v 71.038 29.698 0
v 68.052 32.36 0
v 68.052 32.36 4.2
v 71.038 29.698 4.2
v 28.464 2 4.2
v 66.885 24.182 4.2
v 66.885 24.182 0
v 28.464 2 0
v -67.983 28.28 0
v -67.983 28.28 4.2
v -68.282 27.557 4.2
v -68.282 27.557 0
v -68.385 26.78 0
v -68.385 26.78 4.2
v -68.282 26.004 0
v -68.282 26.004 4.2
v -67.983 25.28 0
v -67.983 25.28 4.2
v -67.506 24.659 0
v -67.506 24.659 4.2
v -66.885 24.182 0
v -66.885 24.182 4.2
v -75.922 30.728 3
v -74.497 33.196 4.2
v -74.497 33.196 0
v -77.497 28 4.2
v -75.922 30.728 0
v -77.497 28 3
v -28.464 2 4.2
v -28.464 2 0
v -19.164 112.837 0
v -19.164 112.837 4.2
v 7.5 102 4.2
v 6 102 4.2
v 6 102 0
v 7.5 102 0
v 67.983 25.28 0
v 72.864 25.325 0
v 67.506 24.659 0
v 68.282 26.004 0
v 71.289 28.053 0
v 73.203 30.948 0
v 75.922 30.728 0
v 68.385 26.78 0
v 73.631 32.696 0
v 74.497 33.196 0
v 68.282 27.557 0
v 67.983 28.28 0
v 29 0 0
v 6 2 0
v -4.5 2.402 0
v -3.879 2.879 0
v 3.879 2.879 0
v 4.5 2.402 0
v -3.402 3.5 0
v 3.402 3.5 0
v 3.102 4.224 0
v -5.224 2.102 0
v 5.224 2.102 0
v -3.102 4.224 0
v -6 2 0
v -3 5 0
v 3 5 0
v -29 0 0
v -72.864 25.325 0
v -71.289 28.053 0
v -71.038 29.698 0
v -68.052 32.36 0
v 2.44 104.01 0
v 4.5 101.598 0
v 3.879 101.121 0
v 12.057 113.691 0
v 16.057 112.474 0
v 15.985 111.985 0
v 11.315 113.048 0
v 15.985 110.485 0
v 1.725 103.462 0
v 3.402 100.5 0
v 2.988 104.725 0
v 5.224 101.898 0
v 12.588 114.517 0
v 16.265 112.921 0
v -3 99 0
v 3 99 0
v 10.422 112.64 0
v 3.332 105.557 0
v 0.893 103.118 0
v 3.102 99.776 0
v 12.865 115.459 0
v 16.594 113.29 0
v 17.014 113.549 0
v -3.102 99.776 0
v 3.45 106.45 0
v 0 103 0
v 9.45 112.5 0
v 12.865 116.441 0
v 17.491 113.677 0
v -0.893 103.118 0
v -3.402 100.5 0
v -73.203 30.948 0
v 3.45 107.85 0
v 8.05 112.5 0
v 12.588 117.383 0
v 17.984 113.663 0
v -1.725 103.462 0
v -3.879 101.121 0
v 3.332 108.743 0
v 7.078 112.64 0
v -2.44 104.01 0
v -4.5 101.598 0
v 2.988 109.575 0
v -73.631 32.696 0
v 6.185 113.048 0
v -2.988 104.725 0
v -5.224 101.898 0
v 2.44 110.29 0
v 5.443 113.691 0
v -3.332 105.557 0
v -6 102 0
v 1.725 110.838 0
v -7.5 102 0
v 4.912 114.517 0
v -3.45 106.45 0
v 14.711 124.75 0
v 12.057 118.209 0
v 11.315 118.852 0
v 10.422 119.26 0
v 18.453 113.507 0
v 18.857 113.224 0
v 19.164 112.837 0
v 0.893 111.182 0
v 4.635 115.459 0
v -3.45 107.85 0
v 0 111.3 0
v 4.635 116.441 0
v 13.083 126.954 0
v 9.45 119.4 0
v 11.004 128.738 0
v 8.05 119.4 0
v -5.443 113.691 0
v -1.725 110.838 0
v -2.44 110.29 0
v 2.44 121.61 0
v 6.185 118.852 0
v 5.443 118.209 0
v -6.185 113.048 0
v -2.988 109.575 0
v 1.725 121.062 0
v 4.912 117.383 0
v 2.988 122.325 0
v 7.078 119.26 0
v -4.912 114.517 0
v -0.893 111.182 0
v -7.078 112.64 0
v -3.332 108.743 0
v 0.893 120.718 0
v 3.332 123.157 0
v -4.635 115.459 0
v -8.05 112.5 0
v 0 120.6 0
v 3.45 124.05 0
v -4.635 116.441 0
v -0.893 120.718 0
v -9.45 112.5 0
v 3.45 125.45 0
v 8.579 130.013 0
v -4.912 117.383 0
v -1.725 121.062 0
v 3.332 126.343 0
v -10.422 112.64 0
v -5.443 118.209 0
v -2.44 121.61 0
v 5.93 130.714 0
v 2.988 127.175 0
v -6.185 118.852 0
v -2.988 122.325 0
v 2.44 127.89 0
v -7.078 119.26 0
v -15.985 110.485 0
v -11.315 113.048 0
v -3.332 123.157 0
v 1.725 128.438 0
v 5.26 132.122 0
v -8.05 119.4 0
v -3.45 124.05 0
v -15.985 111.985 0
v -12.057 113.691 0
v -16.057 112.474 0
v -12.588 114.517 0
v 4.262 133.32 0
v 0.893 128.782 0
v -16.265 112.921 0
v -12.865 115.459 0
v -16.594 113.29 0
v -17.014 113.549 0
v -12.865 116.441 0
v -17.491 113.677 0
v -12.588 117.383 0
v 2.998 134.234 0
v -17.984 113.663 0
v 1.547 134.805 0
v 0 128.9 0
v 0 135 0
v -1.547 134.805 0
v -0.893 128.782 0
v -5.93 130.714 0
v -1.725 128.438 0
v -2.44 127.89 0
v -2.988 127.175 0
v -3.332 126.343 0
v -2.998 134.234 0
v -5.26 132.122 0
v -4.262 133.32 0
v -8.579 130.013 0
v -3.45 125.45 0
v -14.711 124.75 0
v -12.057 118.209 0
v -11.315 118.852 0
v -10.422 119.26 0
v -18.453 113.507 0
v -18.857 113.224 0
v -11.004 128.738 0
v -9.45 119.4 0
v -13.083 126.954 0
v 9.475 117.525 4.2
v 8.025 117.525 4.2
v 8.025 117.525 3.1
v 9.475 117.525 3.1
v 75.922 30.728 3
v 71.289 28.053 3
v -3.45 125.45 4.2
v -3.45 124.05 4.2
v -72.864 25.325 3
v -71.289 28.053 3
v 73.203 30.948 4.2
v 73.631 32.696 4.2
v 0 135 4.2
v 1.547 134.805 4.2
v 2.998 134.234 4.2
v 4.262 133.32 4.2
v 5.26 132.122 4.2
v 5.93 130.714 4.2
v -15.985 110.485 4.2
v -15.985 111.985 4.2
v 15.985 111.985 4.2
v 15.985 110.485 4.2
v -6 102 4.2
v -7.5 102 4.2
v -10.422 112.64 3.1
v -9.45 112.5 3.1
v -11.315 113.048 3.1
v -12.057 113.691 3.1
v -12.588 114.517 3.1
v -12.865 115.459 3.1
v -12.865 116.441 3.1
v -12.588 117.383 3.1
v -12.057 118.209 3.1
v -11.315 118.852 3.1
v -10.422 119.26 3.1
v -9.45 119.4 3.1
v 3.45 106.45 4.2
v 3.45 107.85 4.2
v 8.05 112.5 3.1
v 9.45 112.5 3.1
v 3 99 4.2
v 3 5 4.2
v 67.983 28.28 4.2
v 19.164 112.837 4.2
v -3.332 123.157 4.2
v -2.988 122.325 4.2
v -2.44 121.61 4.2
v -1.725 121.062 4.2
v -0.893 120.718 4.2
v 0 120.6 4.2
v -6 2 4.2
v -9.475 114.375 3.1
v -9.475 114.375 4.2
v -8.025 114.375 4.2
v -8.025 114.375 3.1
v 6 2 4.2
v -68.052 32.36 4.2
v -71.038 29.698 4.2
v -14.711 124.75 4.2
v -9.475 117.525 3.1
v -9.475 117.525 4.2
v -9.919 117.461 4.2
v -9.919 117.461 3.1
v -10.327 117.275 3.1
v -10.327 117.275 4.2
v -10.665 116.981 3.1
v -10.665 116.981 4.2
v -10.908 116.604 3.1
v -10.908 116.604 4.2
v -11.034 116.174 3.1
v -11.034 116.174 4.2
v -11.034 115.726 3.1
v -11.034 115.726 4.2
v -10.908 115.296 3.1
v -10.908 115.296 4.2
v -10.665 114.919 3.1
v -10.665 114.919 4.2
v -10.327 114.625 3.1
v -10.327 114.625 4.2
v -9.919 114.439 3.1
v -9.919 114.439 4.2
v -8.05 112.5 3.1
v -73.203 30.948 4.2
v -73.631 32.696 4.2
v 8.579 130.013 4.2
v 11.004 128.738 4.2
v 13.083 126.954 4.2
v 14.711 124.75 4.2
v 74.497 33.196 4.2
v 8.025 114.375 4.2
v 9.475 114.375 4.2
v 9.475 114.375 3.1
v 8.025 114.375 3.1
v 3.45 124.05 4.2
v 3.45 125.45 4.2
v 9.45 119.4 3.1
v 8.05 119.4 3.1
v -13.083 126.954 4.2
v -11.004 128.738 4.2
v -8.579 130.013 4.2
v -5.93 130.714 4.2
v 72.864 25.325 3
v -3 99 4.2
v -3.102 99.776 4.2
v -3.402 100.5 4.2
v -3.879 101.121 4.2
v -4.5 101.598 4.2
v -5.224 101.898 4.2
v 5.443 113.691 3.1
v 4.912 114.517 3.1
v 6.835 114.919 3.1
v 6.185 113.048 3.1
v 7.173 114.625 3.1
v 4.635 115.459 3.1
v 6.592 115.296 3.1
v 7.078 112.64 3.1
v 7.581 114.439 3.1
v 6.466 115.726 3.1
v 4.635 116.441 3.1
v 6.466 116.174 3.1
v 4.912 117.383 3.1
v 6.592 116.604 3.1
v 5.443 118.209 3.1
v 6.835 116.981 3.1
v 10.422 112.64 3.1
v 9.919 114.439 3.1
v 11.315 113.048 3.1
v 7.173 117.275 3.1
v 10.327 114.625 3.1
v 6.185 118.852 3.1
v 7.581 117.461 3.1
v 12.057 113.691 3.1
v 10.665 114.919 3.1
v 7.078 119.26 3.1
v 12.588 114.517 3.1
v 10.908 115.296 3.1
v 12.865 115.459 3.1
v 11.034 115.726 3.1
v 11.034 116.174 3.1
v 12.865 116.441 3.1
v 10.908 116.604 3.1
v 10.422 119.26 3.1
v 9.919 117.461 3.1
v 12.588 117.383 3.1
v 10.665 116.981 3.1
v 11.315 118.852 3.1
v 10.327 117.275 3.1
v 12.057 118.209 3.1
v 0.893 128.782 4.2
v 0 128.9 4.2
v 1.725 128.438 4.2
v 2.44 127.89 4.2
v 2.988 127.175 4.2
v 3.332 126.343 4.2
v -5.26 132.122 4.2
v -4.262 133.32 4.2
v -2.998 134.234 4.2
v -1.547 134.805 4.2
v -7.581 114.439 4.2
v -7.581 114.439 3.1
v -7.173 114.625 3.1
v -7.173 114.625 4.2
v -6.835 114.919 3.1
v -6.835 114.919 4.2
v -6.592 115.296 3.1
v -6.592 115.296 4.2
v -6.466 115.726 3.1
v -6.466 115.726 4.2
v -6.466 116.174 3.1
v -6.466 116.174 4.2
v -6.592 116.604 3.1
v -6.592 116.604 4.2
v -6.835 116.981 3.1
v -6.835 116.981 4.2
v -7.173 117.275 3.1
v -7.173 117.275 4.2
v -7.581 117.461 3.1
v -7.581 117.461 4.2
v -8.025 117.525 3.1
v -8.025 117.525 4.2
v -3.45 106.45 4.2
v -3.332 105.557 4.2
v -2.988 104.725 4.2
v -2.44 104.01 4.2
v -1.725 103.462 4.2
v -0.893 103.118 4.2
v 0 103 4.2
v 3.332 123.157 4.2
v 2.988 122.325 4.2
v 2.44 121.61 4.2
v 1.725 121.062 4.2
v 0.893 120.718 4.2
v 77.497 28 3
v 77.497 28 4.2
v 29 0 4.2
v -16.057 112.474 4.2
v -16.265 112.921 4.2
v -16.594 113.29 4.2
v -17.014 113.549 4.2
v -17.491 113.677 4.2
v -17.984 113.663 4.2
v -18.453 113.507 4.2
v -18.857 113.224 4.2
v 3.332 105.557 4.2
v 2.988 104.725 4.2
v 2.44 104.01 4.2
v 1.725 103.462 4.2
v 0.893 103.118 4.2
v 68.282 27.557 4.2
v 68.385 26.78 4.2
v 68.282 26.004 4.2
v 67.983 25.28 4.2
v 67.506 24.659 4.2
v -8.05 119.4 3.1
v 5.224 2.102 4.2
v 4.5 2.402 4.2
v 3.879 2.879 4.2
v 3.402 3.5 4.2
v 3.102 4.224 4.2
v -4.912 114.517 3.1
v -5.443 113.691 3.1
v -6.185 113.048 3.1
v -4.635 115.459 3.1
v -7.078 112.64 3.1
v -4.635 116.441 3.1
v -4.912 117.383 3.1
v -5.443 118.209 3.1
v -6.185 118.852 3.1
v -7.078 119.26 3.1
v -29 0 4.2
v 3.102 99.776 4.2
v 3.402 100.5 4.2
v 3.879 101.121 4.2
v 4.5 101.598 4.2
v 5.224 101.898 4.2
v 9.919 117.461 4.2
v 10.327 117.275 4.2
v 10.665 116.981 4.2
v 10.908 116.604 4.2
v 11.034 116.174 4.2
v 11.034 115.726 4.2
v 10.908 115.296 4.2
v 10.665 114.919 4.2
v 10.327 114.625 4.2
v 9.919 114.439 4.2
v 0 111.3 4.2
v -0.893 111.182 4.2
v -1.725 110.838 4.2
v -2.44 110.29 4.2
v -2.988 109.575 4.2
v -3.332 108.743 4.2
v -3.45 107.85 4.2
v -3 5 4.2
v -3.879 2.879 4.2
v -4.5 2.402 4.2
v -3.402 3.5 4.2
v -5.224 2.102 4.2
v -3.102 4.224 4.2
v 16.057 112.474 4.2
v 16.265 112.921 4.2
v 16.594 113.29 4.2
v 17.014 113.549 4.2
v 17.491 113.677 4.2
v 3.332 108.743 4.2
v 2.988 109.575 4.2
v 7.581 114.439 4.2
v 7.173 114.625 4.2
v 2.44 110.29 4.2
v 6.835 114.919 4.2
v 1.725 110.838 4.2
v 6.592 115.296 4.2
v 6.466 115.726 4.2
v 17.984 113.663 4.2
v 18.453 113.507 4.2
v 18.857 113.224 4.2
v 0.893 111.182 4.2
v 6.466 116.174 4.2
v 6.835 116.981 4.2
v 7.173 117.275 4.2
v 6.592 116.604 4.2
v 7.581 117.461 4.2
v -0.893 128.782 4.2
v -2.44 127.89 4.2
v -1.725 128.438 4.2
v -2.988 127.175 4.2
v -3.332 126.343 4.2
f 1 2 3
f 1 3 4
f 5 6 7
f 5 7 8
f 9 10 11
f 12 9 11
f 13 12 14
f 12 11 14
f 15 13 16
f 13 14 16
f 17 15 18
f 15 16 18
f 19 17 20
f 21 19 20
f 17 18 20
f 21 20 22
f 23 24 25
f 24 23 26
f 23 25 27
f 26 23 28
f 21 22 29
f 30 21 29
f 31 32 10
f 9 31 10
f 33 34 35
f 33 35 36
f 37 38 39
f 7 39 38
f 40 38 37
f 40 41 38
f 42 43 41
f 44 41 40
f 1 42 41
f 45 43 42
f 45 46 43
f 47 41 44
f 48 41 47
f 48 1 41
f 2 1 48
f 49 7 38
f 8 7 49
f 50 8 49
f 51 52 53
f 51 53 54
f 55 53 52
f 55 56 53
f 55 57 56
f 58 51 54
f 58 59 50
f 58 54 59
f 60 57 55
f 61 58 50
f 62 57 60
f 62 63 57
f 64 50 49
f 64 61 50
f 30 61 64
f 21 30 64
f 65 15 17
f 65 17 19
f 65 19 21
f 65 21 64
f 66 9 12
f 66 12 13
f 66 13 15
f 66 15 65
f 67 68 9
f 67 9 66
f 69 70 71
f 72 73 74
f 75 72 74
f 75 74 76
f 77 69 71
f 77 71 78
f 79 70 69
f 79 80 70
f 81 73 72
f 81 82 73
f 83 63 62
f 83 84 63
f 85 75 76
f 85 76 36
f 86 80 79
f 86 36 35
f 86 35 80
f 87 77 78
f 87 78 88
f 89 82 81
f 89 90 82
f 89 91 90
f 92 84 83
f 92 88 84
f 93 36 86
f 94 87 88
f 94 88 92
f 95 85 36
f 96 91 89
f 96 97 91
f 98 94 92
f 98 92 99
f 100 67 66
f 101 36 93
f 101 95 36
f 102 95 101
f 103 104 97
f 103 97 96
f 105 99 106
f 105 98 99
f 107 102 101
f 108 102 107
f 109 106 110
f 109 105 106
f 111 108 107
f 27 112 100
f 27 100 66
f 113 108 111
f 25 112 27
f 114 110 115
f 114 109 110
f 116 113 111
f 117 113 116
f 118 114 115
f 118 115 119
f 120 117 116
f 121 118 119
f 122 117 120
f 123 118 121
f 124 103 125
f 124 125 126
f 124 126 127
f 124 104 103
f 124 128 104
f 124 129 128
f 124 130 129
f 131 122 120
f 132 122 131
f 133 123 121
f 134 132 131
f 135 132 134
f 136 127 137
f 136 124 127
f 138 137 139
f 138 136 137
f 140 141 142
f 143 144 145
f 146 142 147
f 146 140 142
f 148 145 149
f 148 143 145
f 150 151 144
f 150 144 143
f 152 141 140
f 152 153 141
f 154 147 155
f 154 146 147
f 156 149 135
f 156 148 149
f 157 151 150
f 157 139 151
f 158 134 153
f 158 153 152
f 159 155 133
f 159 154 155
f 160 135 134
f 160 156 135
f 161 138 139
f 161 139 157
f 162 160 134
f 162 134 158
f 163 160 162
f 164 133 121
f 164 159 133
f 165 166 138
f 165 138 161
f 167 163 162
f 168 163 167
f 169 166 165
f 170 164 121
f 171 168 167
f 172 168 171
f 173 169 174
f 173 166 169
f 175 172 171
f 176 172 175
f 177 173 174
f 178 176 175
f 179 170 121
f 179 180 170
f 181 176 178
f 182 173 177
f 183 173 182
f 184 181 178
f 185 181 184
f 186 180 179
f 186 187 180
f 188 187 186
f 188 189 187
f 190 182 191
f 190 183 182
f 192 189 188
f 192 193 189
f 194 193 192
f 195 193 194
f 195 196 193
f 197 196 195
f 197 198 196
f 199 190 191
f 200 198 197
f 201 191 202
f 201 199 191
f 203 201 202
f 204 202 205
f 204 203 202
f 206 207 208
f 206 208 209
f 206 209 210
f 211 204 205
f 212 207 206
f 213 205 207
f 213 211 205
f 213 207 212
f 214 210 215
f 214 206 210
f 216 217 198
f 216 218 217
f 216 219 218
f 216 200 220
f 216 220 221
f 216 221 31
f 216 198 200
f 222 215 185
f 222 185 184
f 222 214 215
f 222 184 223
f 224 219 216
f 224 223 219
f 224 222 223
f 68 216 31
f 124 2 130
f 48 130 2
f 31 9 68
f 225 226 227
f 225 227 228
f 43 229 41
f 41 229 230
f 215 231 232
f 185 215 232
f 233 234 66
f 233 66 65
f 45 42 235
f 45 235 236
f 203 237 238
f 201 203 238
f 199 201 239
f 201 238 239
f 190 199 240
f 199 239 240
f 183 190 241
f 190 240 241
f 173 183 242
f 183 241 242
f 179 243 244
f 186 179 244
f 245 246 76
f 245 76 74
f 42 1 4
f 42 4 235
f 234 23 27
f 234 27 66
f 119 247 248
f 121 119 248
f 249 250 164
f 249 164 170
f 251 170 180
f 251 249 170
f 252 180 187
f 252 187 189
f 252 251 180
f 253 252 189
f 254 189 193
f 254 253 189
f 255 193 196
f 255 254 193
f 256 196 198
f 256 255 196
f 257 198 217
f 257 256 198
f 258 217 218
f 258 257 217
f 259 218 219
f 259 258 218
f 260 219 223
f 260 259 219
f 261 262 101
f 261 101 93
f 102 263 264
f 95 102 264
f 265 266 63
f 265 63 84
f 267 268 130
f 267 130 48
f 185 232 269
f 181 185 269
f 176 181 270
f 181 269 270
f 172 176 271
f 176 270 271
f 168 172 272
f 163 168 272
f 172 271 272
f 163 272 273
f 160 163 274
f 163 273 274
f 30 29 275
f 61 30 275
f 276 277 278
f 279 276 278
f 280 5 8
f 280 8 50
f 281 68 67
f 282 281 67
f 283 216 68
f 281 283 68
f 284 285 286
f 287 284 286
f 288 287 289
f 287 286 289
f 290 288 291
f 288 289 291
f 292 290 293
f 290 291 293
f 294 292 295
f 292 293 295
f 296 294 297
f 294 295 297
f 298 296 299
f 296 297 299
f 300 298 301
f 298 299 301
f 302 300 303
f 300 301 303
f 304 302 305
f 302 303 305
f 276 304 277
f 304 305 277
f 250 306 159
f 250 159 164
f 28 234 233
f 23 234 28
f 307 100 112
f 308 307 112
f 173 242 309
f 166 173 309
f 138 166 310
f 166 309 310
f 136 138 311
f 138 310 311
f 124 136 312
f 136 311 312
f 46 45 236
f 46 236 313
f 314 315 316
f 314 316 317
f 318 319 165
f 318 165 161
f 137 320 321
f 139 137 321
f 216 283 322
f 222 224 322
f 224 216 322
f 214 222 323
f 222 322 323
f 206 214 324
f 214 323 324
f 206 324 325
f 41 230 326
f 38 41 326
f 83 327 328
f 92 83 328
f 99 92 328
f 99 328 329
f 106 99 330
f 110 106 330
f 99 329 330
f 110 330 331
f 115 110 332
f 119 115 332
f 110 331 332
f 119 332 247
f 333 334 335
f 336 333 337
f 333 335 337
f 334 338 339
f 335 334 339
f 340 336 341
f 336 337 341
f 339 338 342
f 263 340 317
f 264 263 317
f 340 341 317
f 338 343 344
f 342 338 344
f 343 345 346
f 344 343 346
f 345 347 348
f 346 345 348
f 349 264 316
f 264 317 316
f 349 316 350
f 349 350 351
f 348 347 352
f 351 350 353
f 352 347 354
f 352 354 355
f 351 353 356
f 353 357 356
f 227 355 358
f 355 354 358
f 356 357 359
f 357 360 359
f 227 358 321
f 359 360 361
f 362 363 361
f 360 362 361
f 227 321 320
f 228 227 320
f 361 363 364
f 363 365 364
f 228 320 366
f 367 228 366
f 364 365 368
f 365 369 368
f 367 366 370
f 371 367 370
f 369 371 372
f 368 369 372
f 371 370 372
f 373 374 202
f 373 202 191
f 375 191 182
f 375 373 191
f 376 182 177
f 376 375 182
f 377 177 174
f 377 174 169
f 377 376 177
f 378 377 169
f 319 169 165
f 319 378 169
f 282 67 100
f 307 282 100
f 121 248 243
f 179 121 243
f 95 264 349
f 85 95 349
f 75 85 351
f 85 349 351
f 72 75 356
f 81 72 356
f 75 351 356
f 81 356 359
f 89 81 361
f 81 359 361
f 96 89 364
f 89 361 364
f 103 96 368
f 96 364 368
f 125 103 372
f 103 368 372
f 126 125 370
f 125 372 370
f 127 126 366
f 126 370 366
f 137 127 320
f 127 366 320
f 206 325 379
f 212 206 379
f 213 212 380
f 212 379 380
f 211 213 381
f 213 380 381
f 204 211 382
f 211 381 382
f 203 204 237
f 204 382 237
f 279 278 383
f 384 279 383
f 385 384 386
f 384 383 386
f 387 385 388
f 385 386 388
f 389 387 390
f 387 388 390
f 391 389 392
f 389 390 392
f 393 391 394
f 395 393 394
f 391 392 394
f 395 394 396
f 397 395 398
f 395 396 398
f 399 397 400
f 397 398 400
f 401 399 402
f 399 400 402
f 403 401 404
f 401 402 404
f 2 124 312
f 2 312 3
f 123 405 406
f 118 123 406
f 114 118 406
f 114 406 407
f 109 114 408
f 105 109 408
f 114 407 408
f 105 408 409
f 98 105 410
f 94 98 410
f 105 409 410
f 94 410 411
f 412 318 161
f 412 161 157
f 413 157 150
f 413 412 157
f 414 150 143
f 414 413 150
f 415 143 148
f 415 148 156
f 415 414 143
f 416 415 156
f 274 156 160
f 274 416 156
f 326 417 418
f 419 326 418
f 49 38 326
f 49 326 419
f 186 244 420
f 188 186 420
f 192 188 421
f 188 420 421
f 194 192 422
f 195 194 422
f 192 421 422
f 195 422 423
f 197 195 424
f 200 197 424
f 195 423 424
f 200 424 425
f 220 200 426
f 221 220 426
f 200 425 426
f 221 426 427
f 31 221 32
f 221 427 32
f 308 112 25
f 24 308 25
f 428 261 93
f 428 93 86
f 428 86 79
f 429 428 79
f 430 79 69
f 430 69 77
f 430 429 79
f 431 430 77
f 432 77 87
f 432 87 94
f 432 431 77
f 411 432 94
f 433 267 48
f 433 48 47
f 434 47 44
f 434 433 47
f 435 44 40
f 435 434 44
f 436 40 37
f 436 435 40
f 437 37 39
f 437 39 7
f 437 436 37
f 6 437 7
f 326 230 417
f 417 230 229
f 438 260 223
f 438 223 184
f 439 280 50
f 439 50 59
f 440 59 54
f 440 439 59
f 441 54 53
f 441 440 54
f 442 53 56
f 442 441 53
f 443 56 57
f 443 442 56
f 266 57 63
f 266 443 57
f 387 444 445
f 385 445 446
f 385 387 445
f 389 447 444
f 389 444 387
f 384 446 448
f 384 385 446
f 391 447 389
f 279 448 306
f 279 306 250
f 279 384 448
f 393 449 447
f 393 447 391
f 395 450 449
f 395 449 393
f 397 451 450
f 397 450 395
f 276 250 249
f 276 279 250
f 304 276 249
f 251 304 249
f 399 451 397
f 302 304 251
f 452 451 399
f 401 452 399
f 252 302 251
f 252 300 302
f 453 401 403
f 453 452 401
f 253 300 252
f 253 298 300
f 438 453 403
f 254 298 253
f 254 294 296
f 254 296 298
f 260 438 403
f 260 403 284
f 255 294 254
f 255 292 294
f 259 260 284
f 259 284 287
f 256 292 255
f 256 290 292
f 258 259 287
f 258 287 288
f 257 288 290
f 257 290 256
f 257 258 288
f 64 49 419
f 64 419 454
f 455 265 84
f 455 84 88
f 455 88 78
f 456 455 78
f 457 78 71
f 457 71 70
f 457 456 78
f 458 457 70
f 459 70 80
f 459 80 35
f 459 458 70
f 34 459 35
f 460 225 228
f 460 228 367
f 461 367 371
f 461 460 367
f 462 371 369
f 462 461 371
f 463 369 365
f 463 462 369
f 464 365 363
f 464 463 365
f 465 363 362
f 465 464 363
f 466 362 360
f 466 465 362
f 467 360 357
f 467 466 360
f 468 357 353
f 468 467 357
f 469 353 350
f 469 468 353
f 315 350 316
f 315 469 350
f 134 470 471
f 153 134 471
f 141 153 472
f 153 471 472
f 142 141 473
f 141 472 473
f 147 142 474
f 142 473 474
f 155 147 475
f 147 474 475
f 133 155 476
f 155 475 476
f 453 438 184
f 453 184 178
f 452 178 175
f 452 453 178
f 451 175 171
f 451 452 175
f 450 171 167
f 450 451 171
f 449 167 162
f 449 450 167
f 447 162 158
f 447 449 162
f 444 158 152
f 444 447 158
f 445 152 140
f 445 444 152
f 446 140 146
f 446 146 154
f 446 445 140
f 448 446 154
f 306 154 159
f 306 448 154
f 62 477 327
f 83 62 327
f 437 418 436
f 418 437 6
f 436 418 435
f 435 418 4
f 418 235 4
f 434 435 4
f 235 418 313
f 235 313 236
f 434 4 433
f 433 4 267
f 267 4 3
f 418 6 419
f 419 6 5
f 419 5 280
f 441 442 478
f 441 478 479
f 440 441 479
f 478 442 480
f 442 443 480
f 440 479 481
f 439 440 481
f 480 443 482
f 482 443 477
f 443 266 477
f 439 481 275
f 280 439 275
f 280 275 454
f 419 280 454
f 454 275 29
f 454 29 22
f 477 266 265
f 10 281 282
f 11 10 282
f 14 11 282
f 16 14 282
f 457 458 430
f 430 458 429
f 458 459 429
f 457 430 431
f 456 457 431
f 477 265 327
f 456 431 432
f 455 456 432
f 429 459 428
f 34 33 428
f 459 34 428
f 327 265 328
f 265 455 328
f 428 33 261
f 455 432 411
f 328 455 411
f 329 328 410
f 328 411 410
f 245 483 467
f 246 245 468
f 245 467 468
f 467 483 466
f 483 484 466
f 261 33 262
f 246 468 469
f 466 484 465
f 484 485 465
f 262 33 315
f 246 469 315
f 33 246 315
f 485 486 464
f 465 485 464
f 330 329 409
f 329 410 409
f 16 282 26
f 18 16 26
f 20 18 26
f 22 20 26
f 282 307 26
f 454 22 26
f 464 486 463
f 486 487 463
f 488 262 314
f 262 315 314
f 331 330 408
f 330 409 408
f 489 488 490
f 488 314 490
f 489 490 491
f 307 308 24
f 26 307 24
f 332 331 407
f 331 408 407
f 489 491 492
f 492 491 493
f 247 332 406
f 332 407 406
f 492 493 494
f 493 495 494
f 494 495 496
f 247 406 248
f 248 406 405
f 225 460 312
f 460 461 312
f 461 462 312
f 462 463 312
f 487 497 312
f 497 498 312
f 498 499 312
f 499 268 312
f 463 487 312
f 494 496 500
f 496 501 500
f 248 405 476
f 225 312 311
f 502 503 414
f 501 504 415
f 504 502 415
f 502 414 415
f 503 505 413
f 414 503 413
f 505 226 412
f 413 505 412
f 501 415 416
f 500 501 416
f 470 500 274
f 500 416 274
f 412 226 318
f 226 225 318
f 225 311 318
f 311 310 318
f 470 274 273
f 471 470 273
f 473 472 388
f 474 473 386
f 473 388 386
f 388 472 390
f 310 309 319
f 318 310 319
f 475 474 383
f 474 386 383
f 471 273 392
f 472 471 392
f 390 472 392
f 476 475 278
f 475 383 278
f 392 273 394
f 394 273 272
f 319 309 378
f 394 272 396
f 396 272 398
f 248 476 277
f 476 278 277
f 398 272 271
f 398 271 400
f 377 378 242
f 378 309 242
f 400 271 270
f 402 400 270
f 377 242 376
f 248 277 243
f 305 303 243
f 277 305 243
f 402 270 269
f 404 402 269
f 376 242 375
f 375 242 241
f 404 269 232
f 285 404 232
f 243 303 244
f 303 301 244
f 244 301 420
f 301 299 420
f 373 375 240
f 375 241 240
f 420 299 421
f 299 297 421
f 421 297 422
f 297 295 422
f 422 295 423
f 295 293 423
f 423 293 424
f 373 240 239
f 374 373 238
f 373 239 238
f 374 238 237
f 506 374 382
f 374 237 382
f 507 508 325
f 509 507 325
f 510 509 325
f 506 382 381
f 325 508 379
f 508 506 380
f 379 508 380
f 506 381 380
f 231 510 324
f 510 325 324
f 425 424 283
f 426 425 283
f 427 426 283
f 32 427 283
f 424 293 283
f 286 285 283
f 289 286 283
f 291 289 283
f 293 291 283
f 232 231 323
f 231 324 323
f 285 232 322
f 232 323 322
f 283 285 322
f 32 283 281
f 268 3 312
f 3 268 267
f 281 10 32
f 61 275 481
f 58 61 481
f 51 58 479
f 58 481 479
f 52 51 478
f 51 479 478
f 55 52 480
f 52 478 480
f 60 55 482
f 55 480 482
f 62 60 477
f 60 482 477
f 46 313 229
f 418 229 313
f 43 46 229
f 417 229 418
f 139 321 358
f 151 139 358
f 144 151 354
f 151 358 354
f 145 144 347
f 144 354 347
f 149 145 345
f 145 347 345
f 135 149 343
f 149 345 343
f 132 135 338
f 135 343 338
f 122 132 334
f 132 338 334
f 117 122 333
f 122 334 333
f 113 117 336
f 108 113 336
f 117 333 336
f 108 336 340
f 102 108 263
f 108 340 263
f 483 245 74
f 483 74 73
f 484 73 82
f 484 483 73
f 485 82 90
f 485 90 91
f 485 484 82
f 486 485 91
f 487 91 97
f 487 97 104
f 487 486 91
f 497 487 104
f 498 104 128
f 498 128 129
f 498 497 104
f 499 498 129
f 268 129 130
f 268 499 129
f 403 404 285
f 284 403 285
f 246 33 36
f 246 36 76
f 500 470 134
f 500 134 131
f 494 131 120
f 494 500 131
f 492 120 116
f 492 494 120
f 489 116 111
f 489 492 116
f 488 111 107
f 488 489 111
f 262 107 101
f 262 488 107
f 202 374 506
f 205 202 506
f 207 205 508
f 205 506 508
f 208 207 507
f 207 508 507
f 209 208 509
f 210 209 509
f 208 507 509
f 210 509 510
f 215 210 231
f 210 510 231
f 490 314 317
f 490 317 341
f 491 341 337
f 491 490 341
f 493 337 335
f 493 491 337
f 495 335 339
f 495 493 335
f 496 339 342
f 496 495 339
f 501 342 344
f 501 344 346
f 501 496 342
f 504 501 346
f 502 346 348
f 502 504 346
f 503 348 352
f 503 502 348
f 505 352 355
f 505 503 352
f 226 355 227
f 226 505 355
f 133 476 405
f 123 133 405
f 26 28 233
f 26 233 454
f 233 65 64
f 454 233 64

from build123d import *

# Parameters (mm, degrees)
SALIENTE_EXTRUIR1_DEPTH    = 4.2
CORTAR_EXTRUIR1_DEPTH      = 4.2
CORTAR_EXTRUIR2_DEPTH      = 4.2
CORTAR_EXTRUIR3_START      = -3.1
CORTAR_EXTRUIR3_DEPTH      = 3.1
CORTAR_EXTRUIR4_DEPTH      = 156.719268273
CORTAR_EXTRUIR4_DEPTH_BACK = 3
CORTAR_EXTRUIR5_DEPTH      = 156.719268273


with BuildPart() as part:
    # Croquis1 → Saliente-Extruir1 (new body)
    with BuildSketch(Plane.XY):
        Polygon((-29, 0), (0, 0), (0, 135), (-8.793796291, 134.998171452), (-68.052260592, 32.359500504), (-71.038140766, 29.697824418), (-73.203204276, 30.947824418), (-73.631397208, 32.696152423), (-74.497422612, 33.196152423), (-77.497422612, 28), align=None)
    extrude(amount=SALIENTE_EXTRUIR1_DEPTH)

    # Croquis2 → Cortar-Extruir1 (cut)
    with BuildSketch(Plane.XY.offset(4.2)):
        with BuildLine():
            Line((-28.464101615, 2), (-6, 2))
            ThreePointArc((-6, 2), (-3.878679656, 2.878679656), (-3, 5))
            Line((-3, 5), (-3, 99))
            ThreePointArc((-3, 99), (-3.878679656, 101.121320344), (-6, 102))
            Line((-6, 102), (-7.5, 102))
            Line((-7.5, 102), (-15.985281374, 110.485281374))
            Line((-15.985281374, 110.485281374), (-15.985281374, 111.985281374))
            ThreePointArc((-15.985281374, 111.985281374), (-17.247748826, 113.63056104), (-19.163717591, 112.836940891))
            Line((-19.163717591, 112.836940891), (-67.982616962, 28.28012681))
            ThreePointArc((-67.982616962, 28.28012681), (-68.282318046, 26.003669651), (-66.884540421, 24.182050687))
            Line((-66.884540421, 24.182050687), (-28.464101615, 2))
        make_face()
    extrude(amount=-CORTAR_EXTRUIR1_DEPTH, mode=Mode.SUBTRACT)

    # Croquis3 → Cortar-Extruir2 (cut)
    with BuildSketch(Plane.XY.offset(4.2)):
        with BuildLine():
            ThreePointArc((-3.45, 124.05), (-2.439518395, 121.610481605), (0, 120.6))
            Line((0, 120.6), (0, 128.9))
            ThreePointArc((0, 128.9), (-2.439518395, 127.889518395), (-3.45, 125.45))
            Line((-3.45, 125.45), (-3.45, 124.05))
        make_face()
        with BuildLine():
            Line((-3.45, 107.85), (-3.45, 106.45))
            ThreePointArc((-3.45, 106.45), (-2.439518395, 104.010481605), (0, 103))
            Line((0, 103), (0, 111.3))
            ThreePointArc((0, 111.3), (-2.439518395, 110.289518395), (-3.45, 107.85))
        make_face()
        with BuildLine():
            ThreePointArc((-9.475, 117.525), (-11.05, 115.95), (-9.475, 114.375))
            Line((-9.475, 114.375), (-8.025, 114.375))
            ThreePointArc((-8.025, 114.375), (-6.45, 115.95), (-8.025, 117.525))
            Line((-8.025, 117.525), (-9.475, 117.525))
        make_face()
    extrude(amount=-CORTAR_EXTRUIR2_DEPTH, mode=Mode.SUBTRACT)

    # Croquis4 → Cortar-Extruir3 (cut)
    with BuildSketch(Plane(origin=(0, 0, 0), x_dir=(-1, 0, 0), z_dir=(0, 0, -1)).offset(CORTAR_EXTRUIR3_START)):
        with BuildLine():
            ThreePointArc((8.05, 119.4), (4.6, 115.95), (8.05, 112.5))
            Line((8.05, 112.5), (9.45, 112.5))
            ThreePointArc((9.45, 112.5), (12.9, 115.95), (9.45, 119.4))
            Line((9.45, 119.4), (8.05, 119.4))
        make_face()
        with BuildLine():
            Line((8.025, 117.525), (9.475, 117.525))
            ThreePointArc((9.475, 117.525), (11.05, 115.95), (9.475, 114.375))
            Line((9.475, 114.375), (8.025, 114.375))
            ThreePointArc((8.025, 114.375), (6.45, 115.95), (8.025, 117.525))
        make_face(mode=Mode.SUBTRACT)
    extrude(amount=CORTAR_EXTRUIR3_DEPTH, mode=Mode.SUBTRACT)

    # Croquis5 → Cortar-Extruir4 (cut, two sides: drawn at the far end of the back side and taken through both)
    with BuildSketch(Plane(origin=(0, 0, 0), x_dir=(-1, 0, 0), z_dir=(0, 0, -1)).offset(-CORTAR_EXTRUIR4_DEPTH_BACK)):
        Polygon((312.647110497, 167.401042296), (75.922422612, 30.727980022), (71.289186702, 28.052980022), (72.864186702, 25.325), (209.537248976, -211.399687885), (737.036585646, -354.985428944), (840.146447168, 23.815301238), align=None)
    extrude(amount=CORTAR_EXTRUIR4_DEPTH + CORTAR_EXTRUIR4_DEPTH_BACK, mode=Mode.SUBTRACT)

    # Simetría2: part across plane


with BuildPart() as part_1:
    add(part.part)
    add(part.part.mirror(Plane(origin=(0, 0, 4.2), x_dir=(0, 0, 1), z_dir=(-1, 0, 0))))

    # Croquis7 → Cortar-Extruir5 (cut, through all)
    with BuildSketch(Plane.XY.offset(4.2)):
        with BuildLine():
            Line((8.793796291, 134.998171452), (0, 135))
            ThreePointArc((0, 135), (3.658451804, 133.816445156), (5.930432994, 130.714321183))
            ThreePointArc((5.930432994, 130.714321183), (11.003838282, 128.738100788), (14.710580838, 124.75))
            Line((14.710580838, 124.75), (8.793796291, 134.998171452))
        make_face()
        with BuildLine():
            Line((-8.793796291, 134.998171452), (-14.710580838, 124.75))
            ThreePointArc((-14.710580838, 124.75), (-11.003838282, 128.738100788), (-5.930432994, 130.714321183))
            ThreePointArc((-5.930432994, 130.714321183), (-3.658451804, 133.816445156), (0, 135))
            Line((0, 135), (-8.793796291, 134.998171452))
        make_face()
    extrude(amount=-CORTAR_EXTRUIR5_DEPTH, mode=Mode.SUBTRACT)


solid = part_1.part
